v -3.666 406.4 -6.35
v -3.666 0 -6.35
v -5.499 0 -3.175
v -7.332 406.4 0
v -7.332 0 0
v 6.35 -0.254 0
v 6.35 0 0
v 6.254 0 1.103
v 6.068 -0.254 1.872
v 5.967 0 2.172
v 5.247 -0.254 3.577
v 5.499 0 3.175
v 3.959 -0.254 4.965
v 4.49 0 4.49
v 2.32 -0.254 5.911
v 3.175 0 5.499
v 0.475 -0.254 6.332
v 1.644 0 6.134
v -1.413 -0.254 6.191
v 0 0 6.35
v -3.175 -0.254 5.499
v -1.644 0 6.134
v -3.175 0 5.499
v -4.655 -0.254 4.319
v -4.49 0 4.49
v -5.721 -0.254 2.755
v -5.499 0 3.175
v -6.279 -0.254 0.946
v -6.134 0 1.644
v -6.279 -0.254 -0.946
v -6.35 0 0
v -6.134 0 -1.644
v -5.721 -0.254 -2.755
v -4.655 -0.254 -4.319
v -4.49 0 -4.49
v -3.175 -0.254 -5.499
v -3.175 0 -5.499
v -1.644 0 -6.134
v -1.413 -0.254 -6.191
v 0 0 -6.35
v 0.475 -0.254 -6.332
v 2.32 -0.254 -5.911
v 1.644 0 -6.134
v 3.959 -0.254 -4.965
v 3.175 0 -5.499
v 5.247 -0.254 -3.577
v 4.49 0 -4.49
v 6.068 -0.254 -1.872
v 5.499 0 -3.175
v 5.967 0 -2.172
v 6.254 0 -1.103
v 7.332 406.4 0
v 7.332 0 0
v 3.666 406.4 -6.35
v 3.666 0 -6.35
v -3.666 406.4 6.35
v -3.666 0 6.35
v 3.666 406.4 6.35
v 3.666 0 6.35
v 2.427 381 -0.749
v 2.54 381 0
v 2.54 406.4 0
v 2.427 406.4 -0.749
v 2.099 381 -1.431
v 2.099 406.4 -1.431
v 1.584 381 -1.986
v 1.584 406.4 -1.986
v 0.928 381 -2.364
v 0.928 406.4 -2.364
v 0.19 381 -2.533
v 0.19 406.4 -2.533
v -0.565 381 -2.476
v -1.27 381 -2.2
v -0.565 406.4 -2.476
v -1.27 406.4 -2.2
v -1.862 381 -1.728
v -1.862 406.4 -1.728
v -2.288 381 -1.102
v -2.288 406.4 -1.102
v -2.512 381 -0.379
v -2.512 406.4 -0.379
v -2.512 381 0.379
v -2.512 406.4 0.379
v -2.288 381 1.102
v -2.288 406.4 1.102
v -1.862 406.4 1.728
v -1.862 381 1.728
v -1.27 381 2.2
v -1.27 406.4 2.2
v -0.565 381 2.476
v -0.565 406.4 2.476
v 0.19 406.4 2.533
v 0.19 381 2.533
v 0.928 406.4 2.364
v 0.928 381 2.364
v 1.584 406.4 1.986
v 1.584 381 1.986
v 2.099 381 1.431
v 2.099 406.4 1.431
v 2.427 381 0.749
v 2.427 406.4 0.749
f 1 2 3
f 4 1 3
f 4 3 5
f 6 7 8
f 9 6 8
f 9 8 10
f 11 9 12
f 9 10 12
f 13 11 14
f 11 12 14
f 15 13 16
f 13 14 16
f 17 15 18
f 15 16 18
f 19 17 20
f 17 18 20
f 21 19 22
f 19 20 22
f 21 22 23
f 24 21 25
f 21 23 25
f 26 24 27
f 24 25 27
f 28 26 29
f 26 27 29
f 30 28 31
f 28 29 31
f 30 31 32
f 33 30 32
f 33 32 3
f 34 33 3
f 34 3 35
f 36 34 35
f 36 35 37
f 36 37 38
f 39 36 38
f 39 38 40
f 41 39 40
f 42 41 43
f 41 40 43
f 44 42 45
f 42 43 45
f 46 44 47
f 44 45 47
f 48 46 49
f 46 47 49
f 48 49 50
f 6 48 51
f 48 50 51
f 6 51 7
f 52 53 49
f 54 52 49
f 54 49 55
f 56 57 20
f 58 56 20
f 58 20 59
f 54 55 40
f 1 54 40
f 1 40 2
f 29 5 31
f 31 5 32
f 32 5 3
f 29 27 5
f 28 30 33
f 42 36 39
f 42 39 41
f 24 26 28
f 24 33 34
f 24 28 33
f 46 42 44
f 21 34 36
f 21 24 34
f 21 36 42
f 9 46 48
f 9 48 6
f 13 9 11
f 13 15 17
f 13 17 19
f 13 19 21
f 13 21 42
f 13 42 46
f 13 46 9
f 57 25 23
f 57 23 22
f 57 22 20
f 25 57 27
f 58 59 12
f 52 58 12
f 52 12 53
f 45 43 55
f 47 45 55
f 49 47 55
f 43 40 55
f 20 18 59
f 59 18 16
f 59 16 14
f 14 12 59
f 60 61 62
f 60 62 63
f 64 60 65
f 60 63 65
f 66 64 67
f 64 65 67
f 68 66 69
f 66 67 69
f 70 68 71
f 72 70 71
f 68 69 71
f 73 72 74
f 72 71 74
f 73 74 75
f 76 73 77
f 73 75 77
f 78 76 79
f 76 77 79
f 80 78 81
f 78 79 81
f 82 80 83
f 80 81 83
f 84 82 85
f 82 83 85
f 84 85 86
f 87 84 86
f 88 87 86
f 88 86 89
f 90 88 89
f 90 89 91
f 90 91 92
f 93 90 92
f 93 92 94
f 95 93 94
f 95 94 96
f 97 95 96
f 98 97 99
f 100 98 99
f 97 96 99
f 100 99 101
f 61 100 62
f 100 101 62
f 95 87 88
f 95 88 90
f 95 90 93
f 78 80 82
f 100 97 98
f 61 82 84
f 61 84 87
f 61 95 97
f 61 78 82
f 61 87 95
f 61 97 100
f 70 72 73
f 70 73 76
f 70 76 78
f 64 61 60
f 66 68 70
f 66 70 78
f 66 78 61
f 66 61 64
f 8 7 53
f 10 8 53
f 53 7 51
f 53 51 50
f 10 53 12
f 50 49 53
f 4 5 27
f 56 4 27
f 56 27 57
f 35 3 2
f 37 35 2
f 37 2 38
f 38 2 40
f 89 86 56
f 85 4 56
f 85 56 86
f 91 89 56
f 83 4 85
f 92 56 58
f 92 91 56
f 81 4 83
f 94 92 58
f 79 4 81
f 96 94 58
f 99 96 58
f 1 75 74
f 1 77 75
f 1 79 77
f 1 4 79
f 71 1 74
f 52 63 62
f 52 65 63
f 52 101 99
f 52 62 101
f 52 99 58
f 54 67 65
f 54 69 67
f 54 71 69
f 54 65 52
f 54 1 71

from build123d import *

# Parameters (mm, degrees)
BOSS_EXTRUDE1_DEPTH = 406.4
SKETCH2_R           = 2.54
CUT_EXTRUDE1_DEPTH  = 25.4
SKETCH3_R           = 6.35
BOSS_EXTRUDE2_DEPTH = 0.254


with BuildPart() as part:
    # Sketch1 → Boss-Extrude1 (new body)
    with BuildSketch(Plane(origin=(0, 0, 0), x_dir=(1, 0, 0), z_dir=(0, 1, 0))):
        Polygon((7.332348419, 0), (3.666174209, 6.35), (-3.666174209, 6.35), (-7.332348419, 0), (-3.666174209, -6.35), (3.666174209, -6.35), align=None)
    extrude(amount=BOSS_EXTRUDE1_DEPTH)

    # Sketch2 → Cut-Extrude1 (cut)
    with BuildSketch(Plane(origin=(0, 406.4, 0), x_dir=(1, 0, 0), z_dir=(0, 1, 0))):
        Circle(SKETCH2_R)
    extrude(amount=-CUT_EXTRUDE1_DEPTH, mode=Mode.SUBTRACT)

    # Sketch3 → Boss-Extrude2 (add)
    with BuildSketch(Plane.XZ):
        Circle(SKETCH3_R)
    extrude(amount=BOSS_EXTRUDE2_DEPTH)


solid = part.part
